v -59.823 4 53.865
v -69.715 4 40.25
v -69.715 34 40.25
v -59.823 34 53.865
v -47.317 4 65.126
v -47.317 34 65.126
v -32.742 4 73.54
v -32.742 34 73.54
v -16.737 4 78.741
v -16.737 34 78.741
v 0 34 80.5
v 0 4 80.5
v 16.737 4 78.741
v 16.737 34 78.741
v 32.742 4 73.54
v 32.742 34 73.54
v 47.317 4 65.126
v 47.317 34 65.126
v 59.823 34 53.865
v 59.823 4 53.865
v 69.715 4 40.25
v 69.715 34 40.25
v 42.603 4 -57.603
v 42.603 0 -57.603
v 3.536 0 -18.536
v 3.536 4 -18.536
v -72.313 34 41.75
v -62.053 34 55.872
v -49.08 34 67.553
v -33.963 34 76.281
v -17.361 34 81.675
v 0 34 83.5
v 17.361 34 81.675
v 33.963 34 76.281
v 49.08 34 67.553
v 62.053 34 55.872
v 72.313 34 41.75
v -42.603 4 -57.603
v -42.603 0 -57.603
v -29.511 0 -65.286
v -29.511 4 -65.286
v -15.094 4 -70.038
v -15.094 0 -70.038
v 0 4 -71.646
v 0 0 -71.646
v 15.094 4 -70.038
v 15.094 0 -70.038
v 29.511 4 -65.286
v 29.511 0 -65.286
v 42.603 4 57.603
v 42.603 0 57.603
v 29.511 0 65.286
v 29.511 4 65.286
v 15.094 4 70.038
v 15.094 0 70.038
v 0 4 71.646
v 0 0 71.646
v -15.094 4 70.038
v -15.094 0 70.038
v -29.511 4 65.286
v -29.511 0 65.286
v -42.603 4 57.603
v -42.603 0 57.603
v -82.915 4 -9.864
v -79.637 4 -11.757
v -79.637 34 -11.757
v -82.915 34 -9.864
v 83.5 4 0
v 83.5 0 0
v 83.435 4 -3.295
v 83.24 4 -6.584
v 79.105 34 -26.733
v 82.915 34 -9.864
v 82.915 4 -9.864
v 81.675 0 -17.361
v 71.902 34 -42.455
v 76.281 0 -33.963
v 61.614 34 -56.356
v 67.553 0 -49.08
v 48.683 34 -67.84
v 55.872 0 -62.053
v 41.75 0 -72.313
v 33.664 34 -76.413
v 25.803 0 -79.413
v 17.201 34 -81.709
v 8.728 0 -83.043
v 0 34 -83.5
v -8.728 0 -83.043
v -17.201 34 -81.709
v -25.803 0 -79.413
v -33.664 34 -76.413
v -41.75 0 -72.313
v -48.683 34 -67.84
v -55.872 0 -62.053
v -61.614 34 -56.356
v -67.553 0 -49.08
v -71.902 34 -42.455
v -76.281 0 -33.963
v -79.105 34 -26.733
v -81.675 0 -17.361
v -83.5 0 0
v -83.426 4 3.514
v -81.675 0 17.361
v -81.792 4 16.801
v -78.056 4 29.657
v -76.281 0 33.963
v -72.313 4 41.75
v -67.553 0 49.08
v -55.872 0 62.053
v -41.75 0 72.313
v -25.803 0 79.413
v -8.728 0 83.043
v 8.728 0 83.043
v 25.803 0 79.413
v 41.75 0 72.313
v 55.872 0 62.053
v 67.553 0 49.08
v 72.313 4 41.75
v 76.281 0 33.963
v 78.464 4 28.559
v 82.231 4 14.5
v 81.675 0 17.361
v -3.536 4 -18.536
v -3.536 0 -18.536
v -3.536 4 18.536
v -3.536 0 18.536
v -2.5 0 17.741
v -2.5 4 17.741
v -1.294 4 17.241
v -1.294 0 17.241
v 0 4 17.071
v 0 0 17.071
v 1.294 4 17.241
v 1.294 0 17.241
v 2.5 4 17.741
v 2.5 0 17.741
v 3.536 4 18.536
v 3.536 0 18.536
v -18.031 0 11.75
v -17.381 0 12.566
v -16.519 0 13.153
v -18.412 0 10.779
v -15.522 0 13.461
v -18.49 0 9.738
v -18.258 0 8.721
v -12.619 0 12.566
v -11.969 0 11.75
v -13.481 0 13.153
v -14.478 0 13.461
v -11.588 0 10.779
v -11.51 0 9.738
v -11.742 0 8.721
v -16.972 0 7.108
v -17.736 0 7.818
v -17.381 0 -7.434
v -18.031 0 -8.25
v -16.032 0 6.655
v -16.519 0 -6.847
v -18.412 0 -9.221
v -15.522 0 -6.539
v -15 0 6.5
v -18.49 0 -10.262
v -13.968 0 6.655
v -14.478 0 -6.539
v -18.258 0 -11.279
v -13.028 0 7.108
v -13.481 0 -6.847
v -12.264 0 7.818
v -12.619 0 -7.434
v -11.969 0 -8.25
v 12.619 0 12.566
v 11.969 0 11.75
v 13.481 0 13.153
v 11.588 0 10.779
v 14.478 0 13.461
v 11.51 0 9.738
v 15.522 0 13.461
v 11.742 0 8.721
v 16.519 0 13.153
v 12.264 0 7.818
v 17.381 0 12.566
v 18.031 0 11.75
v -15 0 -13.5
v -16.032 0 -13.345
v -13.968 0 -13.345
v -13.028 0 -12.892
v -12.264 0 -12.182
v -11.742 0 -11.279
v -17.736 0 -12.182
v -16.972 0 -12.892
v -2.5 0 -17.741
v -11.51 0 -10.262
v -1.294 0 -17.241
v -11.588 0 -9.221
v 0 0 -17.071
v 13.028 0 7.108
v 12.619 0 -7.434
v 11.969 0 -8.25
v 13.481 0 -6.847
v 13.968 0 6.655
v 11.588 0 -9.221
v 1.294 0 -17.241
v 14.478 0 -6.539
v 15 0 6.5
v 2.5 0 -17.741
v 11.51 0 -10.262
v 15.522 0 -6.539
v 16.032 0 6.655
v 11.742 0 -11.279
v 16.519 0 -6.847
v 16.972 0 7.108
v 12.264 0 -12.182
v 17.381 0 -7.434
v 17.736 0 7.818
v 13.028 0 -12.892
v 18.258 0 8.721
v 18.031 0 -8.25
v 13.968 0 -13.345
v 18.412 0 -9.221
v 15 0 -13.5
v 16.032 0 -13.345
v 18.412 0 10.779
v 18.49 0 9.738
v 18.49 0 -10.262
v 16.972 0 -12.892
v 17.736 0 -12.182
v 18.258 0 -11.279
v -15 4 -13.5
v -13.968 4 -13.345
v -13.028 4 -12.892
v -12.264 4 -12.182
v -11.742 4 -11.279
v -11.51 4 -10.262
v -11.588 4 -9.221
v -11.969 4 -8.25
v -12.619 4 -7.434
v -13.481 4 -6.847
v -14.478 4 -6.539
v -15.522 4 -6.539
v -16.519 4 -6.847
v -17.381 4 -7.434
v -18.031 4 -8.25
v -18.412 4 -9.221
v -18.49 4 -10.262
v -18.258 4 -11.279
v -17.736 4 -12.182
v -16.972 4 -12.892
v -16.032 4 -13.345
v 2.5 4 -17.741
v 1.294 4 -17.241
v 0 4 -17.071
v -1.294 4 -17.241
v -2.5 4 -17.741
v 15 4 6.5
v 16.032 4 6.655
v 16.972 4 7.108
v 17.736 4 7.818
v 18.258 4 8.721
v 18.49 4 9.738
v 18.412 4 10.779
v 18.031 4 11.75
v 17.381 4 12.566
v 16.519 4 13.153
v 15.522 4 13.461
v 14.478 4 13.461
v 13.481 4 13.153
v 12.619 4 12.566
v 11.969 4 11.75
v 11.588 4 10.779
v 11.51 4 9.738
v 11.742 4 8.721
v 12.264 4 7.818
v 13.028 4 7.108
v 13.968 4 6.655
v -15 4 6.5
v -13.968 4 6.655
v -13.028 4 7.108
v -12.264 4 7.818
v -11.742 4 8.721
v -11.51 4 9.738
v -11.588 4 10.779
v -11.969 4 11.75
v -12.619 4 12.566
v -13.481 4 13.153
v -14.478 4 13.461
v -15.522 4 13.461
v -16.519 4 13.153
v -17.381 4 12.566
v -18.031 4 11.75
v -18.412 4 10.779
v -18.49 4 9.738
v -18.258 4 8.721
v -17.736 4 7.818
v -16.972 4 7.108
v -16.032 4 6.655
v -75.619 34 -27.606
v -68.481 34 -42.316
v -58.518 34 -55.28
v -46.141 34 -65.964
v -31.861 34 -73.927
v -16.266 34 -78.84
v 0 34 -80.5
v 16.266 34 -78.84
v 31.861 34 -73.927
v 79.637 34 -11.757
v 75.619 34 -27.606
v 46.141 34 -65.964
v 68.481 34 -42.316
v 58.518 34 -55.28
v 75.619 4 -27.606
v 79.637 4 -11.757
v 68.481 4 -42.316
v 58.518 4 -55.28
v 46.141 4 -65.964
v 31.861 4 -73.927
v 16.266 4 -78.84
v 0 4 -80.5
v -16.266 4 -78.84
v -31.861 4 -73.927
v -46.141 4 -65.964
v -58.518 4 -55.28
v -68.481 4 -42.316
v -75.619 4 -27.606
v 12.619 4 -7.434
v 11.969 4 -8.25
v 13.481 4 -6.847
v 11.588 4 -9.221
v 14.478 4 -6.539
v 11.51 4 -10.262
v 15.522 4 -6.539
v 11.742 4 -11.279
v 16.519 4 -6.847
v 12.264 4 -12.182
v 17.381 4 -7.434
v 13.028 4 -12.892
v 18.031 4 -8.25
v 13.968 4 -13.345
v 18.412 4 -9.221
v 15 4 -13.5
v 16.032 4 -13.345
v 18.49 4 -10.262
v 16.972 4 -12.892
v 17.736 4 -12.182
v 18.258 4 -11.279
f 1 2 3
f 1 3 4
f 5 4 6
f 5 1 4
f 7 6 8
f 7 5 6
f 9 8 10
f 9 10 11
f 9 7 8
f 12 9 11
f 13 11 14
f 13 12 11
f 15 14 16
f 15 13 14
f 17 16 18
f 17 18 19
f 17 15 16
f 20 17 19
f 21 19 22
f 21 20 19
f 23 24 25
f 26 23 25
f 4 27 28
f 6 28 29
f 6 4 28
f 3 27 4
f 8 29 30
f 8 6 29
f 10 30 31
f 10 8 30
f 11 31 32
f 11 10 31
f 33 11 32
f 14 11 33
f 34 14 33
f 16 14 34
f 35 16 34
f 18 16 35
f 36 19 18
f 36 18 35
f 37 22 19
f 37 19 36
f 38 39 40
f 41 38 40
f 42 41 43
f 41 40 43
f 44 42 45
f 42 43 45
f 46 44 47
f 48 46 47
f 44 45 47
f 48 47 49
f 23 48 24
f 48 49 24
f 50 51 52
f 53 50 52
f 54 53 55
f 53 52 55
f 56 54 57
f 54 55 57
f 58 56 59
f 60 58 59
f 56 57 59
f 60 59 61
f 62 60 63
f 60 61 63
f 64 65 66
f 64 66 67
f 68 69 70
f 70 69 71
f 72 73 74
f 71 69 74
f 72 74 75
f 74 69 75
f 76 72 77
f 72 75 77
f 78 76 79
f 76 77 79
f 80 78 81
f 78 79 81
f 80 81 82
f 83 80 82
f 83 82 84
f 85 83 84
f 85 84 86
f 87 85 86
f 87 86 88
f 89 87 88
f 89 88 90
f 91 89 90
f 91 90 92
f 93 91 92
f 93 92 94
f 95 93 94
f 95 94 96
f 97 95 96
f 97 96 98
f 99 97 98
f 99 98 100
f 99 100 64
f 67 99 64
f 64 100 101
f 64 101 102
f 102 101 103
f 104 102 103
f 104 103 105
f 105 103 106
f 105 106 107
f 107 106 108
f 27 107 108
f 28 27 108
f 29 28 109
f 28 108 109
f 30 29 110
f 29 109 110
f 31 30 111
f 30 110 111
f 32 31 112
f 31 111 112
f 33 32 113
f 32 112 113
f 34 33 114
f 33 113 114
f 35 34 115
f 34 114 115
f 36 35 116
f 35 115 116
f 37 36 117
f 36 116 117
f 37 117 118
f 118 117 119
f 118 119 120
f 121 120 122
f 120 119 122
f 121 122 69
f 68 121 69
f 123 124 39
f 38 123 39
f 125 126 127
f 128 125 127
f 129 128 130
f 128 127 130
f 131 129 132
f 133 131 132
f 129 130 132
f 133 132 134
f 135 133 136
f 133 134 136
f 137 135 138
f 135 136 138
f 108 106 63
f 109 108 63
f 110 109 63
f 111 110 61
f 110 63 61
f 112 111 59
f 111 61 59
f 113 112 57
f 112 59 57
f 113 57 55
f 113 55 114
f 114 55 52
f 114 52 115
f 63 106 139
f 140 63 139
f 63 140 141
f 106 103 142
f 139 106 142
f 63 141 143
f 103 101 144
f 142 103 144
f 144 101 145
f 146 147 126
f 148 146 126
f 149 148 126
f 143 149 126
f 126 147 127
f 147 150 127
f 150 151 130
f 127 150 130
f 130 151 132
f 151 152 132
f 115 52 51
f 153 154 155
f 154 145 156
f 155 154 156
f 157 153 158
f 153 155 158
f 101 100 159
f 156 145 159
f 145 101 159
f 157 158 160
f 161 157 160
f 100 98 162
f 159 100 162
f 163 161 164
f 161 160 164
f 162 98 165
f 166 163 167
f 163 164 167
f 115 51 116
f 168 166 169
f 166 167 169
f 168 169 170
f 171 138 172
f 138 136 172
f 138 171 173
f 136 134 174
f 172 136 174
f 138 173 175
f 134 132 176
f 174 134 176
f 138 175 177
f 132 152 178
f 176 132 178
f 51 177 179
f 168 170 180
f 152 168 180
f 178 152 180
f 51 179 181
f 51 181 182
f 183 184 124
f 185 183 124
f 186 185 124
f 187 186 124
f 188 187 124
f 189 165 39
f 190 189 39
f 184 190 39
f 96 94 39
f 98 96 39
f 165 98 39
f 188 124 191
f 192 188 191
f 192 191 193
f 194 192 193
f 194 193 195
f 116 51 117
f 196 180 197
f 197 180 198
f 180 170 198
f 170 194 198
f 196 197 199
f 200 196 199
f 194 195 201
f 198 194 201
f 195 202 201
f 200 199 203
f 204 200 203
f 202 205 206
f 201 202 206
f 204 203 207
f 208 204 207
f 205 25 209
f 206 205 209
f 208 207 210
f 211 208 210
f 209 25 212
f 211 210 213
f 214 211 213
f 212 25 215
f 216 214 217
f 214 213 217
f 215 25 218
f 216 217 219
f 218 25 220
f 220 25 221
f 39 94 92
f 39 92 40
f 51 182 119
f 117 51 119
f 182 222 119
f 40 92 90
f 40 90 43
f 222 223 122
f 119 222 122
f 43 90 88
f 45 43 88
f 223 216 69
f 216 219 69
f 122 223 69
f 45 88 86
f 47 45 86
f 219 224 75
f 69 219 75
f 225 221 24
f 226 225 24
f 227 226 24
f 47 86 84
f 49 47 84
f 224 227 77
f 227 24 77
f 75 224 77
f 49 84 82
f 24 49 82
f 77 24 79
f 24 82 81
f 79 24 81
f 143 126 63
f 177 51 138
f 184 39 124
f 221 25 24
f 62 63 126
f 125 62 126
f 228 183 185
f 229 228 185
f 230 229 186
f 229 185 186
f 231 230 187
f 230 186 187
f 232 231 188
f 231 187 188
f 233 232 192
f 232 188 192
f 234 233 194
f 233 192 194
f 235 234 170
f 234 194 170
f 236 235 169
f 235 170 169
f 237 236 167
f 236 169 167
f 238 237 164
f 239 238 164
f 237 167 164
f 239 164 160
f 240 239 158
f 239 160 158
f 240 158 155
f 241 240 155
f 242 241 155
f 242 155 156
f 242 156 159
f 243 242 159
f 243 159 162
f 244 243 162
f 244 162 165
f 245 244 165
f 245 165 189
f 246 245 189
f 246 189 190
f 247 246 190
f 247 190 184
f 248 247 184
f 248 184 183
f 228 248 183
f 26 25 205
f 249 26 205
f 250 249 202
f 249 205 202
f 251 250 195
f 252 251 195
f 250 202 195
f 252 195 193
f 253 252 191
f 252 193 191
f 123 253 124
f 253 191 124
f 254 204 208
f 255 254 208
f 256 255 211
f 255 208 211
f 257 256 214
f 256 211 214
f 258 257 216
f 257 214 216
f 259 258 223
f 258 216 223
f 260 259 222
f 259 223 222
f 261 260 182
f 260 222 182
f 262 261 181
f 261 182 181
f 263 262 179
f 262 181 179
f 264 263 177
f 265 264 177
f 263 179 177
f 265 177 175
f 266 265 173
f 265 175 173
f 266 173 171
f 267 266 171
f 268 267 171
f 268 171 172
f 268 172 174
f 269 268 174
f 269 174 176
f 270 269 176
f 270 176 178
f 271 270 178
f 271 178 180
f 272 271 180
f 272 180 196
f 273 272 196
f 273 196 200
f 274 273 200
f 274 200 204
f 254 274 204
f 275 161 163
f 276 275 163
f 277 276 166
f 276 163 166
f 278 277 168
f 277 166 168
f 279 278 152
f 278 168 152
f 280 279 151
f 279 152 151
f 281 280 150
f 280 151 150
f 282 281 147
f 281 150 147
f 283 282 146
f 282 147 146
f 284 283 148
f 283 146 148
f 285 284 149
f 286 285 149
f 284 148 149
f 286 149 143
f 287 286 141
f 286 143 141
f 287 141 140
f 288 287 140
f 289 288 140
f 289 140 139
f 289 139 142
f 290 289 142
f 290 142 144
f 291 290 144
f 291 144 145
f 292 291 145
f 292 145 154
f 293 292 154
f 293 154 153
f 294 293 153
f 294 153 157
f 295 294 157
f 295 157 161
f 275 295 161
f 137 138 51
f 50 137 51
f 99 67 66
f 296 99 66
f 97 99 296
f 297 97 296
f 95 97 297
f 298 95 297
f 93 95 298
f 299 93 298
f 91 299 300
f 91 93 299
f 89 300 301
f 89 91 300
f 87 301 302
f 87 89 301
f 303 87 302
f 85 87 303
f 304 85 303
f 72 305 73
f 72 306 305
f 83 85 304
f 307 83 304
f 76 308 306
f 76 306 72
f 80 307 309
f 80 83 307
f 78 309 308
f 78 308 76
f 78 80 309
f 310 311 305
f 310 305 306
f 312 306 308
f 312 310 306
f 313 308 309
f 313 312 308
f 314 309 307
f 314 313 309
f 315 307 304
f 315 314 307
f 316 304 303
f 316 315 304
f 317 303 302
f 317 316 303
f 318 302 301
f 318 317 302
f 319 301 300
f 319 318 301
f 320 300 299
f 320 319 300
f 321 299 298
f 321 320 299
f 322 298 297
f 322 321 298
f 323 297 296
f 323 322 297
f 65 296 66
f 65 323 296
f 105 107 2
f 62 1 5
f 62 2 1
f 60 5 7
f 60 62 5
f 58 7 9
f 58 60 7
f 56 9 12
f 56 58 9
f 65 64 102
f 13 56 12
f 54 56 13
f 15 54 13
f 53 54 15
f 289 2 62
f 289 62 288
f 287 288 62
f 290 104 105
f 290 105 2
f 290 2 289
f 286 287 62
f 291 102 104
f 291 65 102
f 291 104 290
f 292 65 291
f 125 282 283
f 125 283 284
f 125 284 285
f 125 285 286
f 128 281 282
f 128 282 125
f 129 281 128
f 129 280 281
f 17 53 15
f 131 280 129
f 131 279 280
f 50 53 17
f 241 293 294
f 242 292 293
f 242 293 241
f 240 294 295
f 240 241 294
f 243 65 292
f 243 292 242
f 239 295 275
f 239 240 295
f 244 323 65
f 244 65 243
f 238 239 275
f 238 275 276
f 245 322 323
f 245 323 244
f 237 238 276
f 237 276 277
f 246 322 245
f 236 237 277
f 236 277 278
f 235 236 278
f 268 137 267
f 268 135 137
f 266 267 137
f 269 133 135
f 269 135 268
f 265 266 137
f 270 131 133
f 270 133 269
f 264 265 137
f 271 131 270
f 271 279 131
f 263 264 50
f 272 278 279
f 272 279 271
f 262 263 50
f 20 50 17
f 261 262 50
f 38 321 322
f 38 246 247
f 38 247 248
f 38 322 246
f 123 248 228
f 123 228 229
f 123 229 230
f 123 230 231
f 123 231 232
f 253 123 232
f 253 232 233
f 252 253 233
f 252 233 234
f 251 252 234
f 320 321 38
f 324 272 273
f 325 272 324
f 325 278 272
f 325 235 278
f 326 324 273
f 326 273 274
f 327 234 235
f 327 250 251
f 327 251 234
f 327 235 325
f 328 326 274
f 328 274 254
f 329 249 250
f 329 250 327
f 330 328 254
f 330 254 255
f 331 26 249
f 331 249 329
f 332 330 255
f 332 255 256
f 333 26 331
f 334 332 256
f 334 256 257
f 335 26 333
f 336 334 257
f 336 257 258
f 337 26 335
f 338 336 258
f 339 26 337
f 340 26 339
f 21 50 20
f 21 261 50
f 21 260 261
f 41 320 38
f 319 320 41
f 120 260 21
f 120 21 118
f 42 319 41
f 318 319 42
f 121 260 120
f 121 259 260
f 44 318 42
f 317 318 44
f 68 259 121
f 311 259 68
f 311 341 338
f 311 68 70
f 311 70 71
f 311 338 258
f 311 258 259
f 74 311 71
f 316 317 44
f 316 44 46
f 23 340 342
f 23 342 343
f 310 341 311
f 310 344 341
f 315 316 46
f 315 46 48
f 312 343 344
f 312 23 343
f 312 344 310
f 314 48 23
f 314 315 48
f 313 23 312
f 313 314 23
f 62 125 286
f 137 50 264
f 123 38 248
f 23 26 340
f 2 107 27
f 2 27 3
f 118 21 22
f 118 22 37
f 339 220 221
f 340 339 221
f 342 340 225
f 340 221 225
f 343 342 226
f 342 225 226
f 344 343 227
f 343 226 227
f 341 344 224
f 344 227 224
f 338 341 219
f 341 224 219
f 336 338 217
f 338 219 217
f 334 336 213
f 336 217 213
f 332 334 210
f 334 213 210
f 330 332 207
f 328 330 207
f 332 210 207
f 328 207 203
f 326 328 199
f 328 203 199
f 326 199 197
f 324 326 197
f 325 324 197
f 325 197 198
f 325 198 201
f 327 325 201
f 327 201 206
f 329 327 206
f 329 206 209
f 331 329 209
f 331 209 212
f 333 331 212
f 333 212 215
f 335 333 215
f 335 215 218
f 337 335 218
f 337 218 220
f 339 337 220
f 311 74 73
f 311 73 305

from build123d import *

# Parameters (mm, degrees)
CROQUIS1_R              = 80.5
SALIENTE_EXTRUIR1_DEPTH = 4
CROQUIS2_R              = 83.5
CROQUIS2_R_2            = 80.5
EXTRUIR_L_MINA1_DEPTH   = 34
CORTAR_EXTRUIR1_START   = -30
CORTAR_EXTRUIR1_DEPTH   = 30
CORTAR_EXTRUIR3_DEPTH   = 4
CROQUIS6_R              = 3.5
CORTAR_EXTRUIR4_DEPTH   = 10


with BuildPart() as part:
    # Croquis1 → Saliente-Extruir1 (new body)
    with BuildSketch(Plane(origin=(0, 0, 0), x_dir=(1, 0, 0), z_dir=(0, 1, 0))):
        with Locations(Location((0, 0, 0), (0, 0, 270))):
            Circle(CROQUIS1_R)
    extrude(amount=SALIENTE_EXTRUIR1_DEPTH)

    # Croquis2 → Extruir-Lámina1 (add)
    with BuildSketch(Plane(origin=(0, 0, 0), x_dir=(1, 0, 0), z_dir=(0, 1, 0))):
        Circle(CROQUIS2_R)
        Circle(CROQUIS2_R_2, mode=Mode.SUBTRACT)
    extrude(amount=EXTRUIR_L_MINA1_DEPTH)

    # Croquis3 → Cortar-Extruir1 (cut)
    with BuildSketch(Plane(origin=(0, 34, 0), x_dir=(1, 0, 0), z_dir=(0, 1, 0)).offset(CORTAR_EXTRUIR1_START)):
        with BuildLine():
            Line((82.915347707, 9.8638286), (79.63686942, 11.756658922))
            ThreePointArc((79.63686942, 11.756658922), (80.283927371, 5.894150138), (80.5, 0))
            ThreePointArc((80.5, 0), (77.757029016, -20.834933131), (69.715045005, -40.25))
            Line((69.715045005, -40.25), (72.313121216, -41.75))
            ThreePointArc((72.313121216, -41.75), (80.654806495, -21.611390266), (83.5, 0))
            ThreePointArc((83.5, 0), (83.353708776, 4.940570133), (82.915347707, 9.8638286))
        make_face()
        with BuildLine():
            ThreePointArc((-69.715045005, -40.25), (-79.073837194, -15.085697577), (-79.63686942, 11.756658922))
            Line((-79.63686942, 11.756658922), (-82.915347707, 9.8638286))
            ThreePointArc((-82.915347707, 9.8638286), (-81.792213668, -16.801303023), (-72.313121216, -41.75))
            Line((-72.313121216, -41.75), (-69.715045005, -40.25))
        make_face()
    extrude(amount=CORTAR_EXTRUIR1_DEPTH, mode=Mode.SUBTRACT)

    # Croquis4 → Cortar-Extruir3 (cut)
    with BuildSketch(Plane.XZ):
        with BuildLine():
            Line((-42.603387144, 57.603387144), (-3.535533906, 18.535533906))
            ThreePointArc((-3.535533906, 18.535533906), (0, 17.071067812), (3.535533906, 18.535533906))
            Line((3.535533906, 18.535533906), (42.603387144, 57.603387144))
            ThreePointArc((42.603387144, 57.603387144), (0, 71.646345383), (-42.603387144, 57.603387144))
        make_face()
        with BuildLine():
            Line((-3.535533906, -18.535533906), (-42.603387144, -57.603387144))
            ThreePointArc((-42.603387144, -57.603387144), (0, -71.646345383), (42.603387144, -57.603387144))
            Line((42.603387144, -57.603387144), (3.535533906, -18.535533906))
            ThreePointArc((3.535533906, -18.535533906), (0, -17.071067812), (-3.535533906, -18.535533906))
        make_face()
    extrude(amount=-CORTAR_EXTRUIR3_DEPTH, mode=Mode.SUBTRACT)

    # Croquis6 → Cortar-Extruir4 (cut)
    with BuildSketch(Plane.XZ):
        with Locations(Location((-15, 10, 0), (0, 0, 270))):
            Circle(CROQUIS6_R)
        with Locations(Location((-15, -10, 0), (0, 0, 270))):
            Circle(CROQUIS6_R)
        with Locations(Location((15, 10, 0), (0, 0, 270))):
            Circle(CROQUIS6_R)
        with Locations(Location((15, -10, 0), (0, 0, 270))):
            Circle(CROQUIS6_R)
    extrude(amount=-CORTAR_EXTRUIR4_DEPTH, mode=Mode.SUBTRACT)


solid = part.part
